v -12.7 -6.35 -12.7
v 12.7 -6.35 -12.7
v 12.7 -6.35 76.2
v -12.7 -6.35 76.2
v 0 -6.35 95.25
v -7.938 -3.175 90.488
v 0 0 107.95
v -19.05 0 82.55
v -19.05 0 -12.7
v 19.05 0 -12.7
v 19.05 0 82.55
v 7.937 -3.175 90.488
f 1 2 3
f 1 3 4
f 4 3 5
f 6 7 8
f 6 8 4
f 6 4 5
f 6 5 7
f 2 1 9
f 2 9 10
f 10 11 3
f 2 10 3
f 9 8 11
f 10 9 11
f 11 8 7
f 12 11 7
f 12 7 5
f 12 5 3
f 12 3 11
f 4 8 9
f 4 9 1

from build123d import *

# Parameters (mm, degrees)
F5_DEPTH = 12.7


with BuildPart() as f3:
    # F0 (on Front) → F3 section 0
    with BuildSketch(Plane.XZ):
        Polygon((-19.05, 0), (0, 0), (19.05, 0), (19.05, 82.55), (0, 107.95), (-19.05, 82.55), align=None)
    # F2 (on offset) → F3 section 1
    with BuildSketch(Plane.XZ.offset(6.35)):
        Polygon((-12.7, 0), (0, 0), (12.7, 0), (12.7, 76.2), (0, 95.25), (-12.7, 76.2), align=None)
    loft()

    # F4 (on face) → F5 (join)
    with BuildSketch(Plane(origin=(0, 0, 0), x_dir=(1, 0, 0), z_dir=(0, 0, -1))):
        with BuildLine():
            Line((-1.0408426169, 0), (0, 0))
            Line((0, 0), (19.05, 0))
            add(Edge.make_bspline(
                [(19.05, 0), (12.7, 6.35)],
                knots=[0, 0, 1, 1], degree=1))
            Line((12.7, 6.35), (-12.7, 6.35))
            add(Edge.make_bspline(
                [(-19.05, 0), (-12.7, 6.35)],
                knots=[0, 0, 1, 1], degree=1))
            Line((-19.05, 0), (-1.0408426169, 0))
        make_face()
    extrude(amount=F5_DEPTH)


solid = f3.part
